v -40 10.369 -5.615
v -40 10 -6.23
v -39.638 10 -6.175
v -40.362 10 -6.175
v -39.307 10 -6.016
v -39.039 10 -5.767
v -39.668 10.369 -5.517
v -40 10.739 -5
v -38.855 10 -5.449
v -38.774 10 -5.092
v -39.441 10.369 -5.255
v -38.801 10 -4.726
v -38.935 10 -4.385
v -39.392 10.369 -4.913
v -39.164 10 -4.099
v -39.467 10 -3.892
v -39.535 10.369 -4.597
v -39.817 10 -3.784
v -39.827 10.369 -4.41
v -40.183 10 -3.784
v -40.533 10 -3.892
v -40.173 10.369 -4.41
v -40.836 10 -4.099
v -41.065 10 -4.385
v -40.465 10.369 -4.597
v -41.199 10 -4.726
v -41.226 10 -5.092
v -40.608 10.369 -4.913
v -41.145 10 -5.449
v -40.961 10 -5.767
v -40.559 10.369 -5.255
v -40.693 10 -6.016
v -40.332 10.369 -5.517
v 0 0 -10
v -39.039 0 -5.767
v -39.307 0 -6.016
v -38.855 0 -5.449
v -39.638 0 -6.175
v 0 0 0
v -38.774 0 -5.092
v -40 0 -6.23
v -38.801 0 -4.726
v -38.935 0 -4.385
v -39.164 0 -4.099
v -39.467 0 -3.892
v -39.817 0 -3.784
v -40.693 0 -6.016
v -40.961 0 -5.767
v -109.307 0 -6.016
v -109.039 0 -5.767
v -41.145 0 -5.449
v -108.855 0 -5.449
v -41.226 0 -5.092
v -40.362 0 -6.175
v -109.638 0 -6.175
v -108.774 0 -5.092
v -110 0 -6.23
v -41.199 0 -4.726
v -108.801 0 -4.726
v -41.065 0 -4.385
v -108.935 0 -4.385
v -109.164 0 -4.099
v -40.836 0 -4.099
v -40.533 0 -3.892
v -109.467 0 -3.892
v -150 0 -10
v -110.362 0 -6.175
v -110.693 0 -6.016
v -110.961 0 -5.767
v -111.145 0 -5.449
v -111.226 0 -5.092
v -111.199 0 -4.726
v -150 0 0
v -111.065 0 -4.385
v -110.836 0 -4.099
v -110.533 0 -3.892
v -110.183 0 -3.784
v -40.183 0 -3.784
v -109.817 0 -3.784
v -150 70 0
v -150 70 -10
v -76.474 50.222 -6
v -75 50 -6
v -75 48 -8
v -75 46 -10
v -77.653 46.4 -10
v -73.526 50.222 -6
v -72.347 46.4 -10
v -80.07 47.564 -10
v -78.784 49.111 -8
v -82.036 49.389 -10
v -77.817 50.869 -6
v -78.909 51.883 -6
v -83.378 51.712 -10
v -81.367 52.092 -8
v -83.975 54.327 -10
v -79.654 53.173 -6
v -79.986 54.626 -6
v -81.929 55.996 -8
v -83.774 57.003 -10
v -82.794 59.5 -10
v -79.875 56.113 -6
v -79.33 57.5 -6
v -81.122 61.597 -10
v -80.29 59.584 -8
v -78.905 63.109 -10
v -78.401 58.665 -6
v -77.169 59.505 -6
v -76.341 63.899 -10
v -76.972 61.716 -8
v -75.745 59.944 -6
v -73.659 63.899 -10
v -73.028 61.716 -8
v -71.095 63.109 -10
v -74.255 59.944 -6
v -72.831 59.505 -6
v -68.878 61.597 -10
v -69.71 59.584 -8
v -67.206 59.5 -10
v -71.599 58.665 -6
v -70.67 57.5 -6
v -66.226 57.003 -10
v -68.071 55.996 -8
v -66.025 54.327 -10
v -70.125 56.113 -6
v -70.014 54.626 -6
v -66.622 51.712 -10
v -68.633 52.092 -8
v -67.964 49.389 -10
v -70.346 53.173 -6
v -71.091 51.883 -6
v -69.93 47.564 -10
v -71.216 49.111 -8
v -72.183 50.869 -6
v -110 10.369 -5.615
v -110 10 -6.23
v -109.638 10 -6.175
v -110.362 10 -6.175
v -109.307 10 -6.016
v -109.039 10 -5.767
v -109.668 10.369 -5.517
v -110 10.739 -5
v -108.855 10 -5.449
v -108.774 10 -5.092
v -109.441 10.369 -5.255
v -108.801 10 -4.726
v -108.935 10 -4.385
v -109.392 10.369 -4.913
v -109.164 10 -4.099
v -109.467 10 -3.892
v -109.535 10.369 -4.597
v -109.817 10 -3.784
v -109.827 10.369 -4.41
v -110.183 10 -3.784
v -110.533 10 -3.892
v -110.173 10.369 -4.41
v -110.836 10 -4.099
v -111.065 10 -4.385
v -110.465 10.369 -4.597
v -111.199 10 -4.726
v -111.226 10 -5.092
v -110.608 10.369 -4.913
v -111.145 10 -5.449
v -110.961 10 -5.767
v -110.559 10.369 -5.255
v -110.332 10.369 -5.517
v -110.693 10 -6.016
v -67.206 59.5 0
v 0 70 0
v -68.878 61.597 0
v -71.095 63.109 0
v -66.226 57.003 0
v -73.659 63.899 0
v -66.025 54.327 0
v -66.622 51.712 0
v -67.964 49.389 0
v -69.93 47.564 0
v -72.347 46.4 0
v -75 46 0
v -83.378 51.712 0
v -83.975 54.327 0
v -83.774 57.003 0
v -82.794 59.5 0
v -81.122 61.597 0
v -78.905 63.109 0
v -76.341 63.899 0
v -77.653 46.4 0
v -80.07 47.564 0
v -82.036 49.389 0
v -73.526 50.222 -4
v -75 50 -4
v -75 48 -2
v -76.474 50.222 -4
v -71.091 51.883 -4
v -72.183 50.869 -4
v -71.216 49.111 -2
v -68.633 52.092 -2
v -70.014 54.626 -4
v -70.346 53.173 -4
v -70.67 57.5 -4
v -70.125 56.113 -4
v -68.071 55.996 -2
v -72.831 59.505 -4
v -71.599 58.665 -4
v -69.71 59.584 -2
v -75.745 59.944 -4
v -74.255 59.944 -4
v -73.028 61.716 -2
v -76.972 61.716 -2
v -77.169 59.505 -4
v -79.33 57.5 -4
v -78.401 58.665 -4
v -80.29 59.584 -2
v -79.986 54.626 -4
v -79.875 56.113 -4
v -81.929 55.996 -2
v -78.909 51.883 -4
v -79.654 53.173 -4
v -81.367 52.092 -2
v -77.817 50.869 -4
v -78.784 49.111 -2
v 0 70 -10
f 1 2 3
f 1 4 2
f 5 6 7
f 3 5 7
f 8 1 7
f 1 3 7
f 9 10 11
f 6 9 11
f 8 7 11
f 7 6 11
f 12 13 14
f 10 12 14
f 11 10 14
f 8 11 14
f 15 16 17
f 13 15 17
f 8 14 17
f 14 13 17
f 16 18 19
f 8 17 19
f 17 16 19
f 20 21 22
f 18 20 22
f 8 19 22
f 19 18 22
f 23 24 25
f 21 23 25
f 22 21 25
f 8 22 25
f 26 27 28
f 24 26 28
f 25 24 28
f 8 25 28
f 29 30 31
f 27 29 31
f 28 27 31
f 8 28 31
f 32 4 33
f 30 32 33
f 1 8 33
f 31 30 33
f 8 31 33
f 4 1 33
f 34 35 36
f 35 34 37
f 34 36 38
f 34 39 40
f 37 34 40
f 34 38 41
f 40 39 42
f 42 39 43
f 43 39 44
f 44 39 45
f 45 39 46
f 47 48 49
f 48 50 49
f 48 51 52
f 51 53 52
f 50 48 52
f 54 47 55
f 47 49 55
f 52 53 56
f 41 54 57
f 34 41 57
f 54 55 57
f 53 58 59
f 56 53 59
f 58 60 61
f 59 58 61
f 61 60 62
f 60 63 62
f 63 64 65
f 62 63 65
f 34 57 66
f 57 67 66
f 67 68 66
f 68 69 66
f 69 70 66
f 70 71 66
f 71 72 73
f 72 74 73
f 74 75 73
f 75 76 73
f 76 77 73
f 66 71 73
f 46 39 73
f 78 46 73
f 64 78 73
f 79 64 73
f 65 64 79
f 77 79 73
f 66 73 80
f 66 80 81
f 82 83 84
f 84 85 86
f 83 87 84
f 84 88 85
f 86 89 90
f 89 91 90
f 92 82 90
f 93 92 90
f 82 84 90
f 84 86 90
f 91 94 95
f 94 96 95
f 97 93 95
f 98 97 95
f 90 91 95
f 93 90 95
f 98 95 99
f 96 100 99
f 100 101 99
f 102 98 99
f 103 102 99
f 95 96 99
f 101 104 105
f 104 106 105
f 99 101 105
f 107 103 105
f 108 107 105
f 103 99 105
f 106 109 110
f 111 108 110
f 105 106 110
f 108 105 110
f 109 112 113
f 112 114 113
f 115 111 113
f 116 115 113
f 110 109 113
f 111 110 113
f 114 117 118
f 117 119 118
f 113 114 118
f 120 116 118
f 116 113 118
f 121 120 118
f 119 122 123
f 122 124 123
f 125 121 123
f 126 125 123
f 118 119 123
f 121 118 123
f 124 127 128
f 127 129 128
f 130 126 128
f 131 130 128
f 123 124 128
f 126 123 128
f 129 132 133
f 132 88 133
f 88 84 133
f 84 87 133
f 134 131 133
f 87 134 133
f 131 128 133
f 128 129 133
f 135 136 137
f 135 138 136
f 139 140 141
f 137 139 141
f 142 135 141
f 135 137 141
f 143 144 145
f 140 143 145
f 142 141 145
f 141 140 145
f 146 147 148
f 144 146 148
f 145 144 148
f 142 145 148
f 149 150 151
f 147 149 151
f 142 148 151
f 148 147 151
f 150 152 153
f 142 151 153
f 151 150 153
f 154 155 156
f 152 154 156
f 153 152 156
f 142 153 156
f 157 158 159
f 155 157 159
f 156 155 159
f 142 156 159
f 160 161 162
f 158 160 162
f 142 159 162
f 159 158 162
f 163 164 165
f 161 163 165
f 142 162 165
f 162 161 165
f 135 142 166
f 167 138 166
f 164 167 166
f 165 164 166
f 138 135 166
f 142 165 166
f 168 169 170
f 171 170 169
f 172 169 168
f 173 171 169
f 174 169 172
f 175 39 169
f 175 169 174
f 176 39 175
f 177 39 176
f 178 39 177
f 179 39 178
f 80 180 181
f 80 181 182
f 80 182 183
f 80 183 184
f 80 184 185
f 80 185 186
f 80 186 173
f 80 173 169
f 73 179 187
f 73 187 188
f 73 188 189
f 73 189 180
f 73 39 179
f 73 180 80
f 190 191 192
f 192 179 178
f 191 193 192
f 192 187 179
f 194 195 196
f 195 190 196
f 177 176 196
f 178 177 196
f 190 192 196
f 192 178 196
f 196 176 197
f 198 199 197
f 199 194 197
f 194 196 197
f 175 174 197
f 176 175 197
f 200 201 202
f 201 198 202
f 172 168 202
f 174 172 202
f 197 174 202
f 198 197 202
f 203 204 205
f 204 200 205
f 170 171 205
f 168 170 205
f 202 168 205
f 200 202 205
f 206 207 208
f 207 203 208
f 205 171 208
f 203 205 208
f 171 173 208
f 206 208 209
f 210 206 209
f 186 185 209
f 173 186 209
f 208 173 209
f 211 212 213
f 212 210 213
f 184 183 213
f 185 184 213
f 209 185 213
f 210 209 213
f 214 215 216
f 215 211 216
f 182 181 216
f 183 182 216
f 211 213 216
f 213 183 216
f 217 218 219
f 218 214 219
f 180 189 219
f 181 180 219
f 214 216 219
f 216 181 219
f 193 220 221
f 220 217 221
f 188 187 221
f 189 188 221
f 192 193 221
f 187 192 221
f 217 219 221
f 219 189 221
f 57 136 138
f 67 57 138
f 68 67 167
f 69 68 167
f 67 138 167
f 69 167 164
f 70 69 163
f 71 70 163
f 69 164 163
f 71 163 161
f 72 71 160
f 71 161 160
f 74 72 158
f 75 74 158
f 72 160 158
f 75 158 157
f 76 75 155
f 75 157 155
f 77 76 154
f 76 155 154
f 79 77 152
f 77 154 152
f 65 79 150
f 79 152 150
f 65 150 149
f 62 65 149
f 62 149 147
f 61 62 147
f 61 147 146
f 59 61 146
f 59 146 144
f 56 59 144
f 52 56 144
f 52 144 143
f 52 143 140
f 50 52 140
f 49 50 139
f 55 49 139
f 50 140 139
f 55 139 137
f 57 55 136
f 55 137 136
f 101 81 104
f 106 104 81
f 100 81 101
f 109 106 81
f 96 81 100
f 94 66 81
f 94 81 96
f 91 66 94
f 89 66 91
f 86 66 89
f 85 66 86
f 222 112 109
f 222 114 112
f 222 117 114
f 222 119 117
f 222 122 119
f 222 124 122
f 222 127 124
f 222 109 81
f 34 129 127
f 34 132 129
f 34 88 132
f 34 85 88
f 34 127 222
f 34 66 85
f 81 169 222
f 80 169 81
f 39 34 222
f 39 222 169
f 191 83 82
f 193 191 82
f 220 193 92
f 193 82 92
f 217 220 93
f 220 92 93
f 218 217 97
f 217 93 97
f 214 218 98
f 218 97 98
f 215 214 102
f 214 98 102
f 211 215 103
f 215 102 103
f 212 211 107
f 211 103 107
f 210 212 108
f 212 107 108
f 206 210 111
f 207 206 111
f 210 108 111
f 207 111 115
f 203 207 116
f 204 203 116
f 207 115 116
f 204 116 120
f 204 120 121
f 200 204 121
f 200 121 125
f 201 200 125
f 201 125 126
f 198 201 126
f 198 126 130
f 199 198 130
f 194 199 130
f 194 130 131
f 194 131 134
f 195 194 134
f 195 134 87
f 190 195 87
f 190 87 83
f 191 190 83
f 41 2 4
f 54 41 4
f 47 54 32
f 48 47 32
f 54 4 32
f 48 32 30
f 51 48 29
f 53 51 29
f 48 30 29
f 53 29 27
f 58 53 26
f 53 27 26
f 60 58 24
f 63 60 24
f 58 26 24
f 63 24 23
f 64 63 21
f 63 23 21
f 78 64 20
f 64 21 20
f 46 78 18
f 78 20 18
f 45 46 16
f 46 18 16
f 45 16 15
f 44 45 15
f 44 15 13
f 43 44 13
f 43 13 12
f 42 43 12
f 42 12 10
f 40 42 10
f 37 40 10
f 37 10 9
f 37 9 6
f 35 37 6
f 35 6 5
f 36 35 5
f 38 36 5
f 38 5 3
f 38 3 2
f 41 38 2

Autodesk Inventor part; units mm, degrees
ref_plane "YZ Plane" through (0, 0, 0) normal (1, 0, 0) x (0, 1, 0)
ref_plane "XZ Plane" through (0, 0, 0) normal (0, 1, 0) x (-1, 0, 0)
ref_plane "XY Plane" through (0, 0, 0) normal (0, 0, 1) x (1, 0, 0)
sketch "Sketch1" plane through (0, 0, 0) normal (0, 1, 0) x (-1, 0, 0)
  line L0 (0, 0) -> (150, 0)
  line L1 (150, 0) -> (150, -10)
  line L2 (150, -10) -> (0, -10)
  line L3 (0, -10) -> (0, 0)
  dimension "d0" = 150
  dimension "d1" = 10
extrude "Extrusion1" add sketch "Sketch1" along normal blind 70
sketch "Sketch2" plane through (-150, 0, 0) normal (0, 0, 1) x (1, 0, 0)
  line L0 (0, 70) -> (150, 70) projected
  line L1 (150, 0) -> (0, 0) projected
  line L2 (0, 0) -> (0, 70) projected
  point P0 (75, 55)
  dimension "d5" = 55
  dimension "d6" = 75
hole "Hole1" at (-75, 55, 0) direction (0, 0, -1) diameter 10 depth 10 tip angle 118
chamfer "Chamfer1" distance 4 angle 45 1 edges at (-75, 60, 0)
sketch "Sketch3" plane through (0, 0, 0) normal (0, -1, 0) x (1, 0, 0)
  line L0 (0, 0) -> (-150, 0) projected
  line L1 (-150, 0) -> (-150, -10) projected
  line L2 (0, -10) -> (0, 0) projected
  point P0 (-40, -5)
  point P1 (-110, -5)
  dimension "d18" = 5
  dimension "d19" = 5
  dimension "d20" = 40
  dimension "d21" = 40
hole "Hole2" at (-40, 0, -5) at (-110, 0, -5) direction (0, 1, 0) diameter 2.459 depth 10 tip angle 118 thread size "M3x0.5" class "6H" standard "ANSI Metric M Profile"
chamfer "Chamfer2" distance 4 angle 45 1 edges at (-75, 60, -10)
properties part number "cathetherEntry"
